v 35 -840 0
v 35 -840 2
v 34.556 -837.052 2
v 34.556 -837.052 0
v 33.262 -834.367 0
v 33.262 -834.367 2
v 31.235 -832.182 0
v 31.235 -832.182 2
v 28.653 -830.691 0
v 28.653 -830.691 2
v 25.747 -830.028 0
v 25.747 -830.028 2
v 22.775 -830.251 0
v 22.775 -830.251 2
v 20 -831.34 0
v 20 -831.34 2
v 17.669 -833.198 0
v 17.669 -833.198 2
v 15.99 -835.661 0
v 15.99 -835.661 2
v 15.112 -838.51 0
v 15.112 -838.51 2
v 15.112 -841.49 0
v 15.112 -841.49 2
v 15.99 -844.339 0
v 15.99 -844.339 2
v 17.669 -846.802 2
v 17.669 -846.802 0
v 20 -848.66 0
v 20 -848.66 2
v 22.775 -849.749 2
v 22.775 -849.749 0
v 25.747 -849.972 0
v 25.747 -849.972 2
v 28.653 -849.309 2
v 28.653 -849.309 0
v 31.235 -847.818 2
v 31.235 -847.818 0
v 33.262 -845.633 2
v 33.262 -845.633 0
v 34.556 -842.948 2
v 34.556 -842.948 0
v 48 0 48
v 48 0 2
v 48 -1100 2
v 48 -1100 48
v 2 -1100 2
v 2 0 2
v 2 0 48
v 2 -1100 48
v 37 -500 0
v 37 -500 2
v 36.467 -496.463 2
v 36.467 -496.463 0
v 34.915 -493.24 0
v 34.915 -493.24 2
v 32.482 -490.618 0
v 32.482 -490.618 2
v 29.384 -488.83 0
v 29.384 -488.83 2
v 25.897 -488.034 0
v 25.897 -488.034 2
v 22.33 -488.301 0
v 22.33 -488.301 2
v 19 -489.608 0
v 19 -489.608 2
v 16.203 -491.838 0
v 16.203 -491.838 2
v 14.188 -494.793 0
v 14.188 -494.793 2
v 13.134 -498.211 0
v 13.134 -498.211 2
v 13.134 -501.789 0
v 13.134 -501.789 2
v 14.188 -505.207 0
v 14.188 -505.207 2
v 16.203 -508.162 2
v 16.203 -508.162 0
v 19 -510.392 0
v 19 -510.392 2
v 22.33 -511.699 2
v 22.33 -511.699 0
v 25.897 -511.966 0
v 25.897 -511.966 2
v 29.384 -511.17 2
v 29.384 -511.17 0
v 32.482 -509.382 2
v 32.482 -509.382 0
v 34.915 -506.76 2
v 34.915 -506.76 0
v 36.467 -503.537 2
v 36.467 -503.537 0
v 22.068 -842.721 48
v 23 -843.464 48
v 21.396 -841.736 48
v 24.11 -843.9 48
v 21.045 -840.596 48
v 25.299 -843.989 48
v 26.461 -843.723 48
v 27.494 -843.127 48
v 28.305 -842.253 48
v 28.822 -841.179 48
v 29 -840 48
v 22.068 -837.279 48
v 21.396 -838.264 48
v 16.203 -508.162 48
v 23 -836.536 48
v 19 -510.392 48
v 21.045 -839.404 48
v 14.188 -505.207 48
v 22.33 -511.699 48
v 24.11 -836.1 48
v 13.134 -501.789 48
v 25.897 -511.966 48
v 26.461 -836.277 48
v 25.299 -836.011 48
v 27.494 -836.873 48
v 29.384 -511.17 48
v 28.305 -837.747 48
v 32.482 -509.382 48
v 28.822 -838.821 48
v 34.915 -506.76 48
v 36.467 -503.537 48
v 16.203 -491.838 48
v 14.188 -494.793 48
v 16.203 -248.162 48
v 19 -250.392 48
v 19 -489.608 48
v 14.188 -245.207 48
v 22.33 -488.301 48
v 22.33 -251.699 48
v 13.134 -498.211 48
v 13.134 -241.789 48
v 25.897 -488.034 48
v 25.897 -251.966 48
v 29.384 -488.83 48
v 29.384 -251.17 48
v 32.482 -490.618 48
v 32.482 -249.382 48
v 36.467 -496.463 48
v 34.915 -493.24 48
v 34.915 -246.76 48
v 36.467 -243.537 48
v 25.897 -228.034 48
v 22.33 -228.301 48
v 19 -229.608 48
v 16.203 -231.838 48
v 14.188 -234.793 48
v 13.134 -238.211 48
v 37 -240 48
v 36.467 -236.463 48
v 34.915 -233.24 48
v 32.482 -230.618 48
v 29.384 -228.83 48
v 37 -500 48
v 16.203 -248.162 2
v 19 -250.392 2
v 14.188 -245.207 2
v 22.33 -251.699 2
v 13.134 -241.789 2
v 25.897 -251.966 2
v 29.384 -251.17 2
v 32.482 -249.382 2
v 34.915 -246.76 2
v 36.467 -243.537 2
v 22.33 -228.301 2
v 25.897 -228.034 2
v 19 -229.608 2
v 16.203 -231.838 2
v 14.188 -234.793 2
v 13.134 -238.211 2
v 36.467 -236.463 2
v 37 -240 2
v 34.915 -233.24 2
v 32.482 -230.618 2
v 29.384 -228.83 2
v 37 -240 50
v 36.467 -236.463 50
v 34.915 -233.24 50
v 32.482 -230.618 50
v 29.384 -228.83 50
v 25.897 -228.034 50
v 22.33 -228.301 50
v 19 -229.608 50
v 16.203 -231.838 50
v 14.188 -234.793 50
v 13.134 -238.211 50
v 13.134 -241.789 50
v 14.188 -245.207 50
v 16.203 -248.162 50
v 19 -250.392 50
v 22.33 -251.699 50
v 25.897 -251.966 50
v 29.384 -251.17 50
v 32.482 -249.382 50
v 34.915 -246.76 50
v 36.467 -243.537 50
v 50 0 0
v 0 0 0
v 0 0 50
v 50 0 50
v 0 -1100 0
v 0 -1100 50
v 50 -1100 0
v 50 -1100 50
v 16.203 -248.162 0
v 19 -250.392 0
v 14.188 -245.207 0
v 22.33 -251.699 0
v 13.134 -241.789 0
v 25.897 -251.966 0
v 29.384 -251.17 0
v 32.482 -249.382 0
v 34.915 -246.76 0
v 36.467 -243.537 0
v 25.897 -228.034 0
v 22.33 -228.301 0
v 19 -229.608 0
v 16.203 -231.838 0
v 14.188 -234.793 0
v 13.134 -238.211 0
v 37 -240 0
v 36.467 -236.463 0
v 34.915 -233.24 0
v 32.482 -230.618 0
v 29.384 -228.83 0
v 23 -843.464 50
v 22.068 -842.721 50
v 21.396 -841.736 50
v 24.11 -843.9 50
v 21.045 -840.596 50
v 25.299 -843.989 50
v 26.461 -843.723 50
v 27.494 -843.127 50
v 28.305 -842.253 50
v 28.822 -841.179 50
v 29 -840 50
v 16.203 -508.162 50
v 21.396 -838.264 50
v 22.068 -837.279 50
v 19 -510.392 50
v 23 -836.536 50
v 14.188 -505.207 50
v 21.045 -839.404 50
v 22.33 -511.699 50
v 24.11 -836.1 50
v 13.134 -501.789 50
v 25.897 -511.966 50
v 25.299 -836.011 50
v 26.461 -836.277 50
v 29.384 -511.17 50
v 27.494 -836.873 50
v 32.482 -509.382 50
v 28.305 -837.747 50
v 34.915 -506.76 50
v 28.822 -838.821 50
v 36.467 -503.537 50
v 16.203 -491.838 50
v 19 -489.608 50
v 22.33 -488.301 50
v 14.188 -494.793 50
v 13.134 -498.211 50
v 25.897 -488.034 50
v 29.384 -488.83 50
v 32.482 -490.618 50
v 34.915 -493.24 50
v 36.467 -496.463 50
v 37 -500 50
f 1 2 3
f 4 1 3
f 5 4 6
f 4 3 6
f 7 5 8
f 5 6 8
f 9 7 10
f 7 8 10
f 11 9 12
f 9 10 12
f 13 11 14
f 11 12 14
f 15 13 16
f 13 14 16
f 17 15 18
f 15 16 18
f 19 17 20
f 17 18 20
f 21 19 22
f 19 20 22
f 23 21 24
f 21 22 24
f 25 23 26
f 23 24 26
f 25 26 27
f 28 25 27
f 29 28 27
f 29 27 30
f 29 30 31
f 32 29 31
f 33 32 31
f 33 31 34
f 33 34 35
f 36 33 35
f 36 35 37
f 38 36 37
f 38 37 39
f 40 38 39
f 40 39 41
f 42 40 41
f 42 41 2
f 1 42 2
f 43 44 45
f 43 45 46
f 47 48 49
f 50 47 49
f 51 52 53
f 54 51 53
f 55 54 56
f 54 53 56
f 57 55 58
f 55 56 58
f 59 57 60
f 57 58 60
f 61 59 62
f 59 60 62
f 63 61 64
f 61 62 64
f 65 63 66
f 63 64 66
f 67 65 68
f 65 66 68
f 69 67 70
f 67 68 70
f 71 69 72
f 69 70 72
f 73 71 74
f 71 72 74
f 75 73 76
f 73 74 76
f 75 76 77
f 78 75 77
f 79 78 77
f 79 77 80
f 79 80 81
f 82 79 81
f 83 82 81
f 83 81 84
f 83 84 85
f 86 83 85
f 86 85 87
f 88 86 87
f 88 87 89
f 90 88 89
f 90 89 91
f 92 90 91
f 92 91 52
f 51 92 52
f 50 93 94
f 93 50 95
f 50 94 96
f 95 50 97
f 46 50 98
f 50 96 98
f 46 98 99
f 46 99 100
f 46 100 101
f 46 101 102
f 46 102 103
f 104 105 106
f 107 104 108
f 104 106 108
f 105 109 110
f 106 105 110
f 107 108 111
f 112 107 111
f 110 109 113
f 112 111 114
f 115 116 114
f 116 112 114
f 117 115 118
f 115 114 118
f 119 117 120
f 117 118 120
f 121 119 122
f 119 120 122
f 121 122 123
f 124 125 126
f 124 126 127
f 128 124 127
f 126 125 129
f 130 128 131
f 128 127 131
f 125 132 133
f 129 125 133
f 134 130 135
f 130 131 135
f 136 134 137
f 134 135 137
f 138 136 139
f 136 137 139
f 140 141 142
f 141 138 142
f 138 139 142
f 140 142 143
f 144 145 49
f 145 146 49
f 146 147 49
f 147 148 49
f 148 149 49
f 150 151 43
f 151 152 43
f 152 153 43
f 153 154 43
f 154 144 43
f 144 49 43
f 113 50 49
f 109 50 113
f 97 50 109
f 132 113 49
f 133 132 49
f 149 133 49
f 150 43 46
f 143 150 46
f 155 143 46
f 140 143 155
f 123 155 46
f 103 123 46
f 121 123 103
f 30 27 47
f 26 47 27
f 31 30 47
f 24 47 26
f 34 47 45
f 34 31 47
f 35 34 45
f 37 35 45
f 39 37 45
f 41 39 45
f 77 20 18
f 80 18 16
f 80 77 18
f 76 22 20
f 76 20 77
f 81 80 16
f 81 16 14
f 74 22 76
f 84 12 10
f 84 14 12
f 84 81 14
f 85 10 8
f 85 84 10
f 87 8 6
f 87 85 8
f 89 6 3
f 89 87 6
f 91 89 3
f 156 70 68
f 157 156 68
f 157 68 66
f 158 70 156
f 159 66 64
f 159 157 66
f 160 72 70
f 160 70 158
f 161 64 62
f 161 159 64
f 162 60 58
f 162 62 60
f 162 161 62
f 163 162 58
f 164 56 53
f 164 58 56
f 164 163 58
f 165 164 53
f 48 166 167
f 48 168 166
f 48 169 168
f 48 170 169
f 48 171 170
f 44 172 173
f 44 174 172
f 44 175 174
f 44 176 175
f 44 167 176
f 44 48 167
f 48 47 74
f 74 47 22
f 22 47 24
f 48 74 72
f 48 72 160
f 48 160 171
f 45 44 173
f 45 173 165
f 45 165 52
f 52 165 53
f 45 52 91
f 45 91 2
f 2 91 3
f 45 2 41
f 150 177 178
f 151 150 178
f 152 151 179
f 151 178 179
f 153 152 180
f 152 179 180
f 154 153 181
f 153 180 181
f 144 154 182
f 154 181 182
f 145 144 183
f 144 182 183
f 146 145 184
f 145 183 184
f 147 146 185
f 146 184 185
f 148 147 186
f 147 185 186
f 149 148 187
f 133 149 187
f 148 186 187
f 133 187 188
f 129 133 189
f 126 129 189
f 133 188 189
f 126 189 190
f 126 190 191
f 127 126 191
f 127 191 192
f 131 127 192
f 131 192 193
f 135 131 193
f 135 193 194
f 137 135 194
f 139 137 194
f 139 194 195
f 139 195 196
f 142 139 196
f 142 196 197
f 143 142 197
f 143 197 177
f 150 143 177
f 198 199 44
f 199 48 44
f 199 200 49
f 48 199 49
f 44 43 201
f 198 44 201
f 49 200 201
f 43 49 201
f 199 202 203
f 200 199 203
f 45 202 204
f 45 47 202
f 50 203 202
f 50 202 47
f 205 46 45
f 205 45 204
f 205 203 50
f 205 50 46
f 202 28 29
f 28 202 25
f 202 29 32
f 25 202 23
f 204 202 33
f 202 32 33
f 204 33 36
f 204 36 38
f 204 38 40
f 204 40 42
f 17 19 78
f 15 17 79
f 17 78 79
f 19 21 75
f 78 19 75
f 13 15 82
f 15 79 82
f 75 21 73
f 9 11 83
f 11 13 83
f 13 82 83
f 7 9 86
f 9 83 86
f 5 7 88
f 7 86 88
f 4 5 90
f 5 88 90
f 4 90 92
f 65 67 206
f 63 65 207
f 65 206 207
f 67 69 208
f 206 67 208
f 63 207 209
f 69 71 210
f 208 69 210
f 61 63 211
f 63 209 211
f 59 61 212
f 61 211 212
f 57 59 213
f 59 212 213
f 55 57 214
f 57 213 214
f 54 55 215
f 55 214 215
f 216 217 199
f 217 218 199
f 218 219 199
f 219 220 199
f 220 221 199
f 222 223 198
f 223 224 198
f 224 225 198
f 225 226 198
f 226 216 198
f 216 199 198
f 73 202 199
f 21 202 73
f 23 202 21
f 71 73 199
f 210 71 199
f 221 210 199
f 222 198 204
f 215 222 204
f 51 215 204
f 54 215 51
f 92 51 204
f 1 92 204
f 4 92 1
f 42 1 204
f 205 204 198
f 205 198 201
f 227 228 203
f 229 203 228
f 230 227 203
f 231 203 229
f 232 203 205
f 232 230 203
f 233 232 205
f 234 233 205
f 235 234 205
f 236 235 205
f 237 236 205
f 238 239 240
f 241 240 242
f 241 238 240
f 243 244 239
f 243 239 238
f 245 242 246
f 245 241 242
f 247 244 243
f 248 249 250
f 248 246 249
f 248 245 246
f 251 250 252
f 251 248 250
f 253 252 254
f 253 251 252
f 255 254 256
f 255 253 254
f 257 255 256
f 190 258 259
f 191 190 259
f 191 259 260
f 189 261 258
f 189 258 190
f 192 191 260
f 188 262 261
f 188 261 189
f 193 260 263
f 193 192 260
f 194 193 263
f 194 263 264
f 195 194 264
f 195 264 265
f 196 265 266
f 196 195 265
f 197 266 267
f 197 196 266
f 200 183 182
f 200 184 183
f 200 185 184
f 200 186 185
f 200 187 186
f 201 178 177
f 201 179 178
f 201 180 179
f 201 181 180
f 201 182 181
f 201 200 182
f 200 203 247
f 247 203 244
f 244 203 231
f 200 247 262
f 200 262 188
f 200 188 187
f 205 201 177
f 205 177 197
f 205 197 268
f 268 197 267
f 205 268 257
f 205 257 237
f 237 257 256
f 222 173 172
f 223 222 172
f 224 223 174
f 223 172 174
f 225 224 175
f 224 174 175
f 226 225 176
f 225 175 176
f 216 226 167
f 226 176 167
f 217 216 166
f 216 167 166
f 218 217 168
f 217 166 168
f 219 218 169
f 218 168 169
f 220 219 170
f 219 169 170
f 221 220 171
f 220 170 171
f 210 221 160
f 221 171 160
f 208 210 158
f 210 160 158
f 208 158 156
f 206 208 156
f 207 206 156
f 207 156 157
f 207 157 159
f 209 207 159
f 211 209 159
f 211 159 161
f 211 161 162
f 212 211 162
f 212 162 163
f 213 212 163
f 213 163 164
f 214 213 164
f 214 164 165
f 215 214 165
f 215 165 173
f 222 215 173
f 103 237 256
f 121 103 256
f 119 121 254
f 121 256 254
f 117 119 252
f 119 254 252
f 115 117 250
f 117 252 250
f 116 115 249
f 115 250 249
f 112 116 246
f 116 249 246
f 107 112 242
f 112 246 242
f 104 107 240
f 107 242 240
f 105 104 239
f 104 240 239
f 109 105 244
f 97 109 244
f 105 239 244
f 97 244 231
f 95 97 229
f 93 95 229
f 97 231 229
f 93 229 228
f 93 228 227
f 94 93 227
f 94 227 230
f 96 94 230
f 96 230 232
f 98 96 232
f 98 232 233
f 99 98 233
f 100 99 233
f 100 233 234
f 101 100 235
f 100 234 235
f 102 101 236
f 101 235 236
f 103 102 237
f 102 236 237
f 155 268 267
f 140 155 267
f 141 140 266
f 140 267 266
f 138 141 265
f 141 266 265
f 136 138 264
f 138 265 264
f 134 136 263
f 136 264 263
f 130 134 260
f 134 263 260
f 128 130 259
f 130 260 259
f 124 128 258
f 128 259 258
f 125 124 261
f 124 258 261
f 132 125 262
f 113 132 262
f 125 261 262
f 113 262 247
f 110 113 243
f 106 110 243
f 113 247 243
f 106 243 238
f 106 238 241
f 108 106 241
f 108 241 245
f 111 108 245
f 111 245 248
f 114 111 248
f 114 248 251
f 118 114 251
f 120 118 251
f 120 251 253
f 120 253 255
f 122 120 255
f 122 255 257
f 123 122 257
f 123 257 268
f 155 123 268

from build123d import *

# Parameters (mm, degrees)
F0_W     = 50
F0_H     = 50
F0_W_2   = 46
F0_H_2   = 46
F1_DEPTH = 1100
F2_R     = 12
F3_DEPTH = 50.001
F4_R     = 10
F5_DEPTH = 50.001
F6_R     = 10
F6_R_2   = 4
F7_DEPTH = 2


with BuildPart() as f1:
    # F0 (on Front) → F1 (new body)
    with BuildSketch(Plane.XZ):
        with Locations((25, 25)):
            Rectangle(F0_W, F0_H)
        with Locations((25, 25)):
            Rectangle(F0_W_2, F0_H_2, mode=Mode.SUBTRACT)
    extrude(amount=F1_DEPTH)

    # F2 (on face) → F3 (cut, through all)
    with BuildSketch(Plane.XY.offset(50)):
        with Locations((25, -500)):
            Circle(F2_R)
        with Locations((25, -240)):
            Circle(F2_R)
    extrude(amount=-F3_DEPTH, mode=Mode.SUBTRACT)

    # F4 (on face) → F5 (cut, through all)
    with BuildSketch(Plane.XY.offset(50)):
        with Locations((25, -840)):
            Circle(F4_R)
    extrude(amount=-F5_DEPTH, mode=Mode.SUBTRACT)

    # F6 (on face) → F7 (join)
    with BuildSketch(Plane.XY.offset(50)):
        with Locations((25, -840)):
            Circle(F6_R)
        with Locations((25, -840)):
            Circle(F6_R_2, mode=Mode.SUBTRACT)
    extrude(amount=-F7_DEPTH)


solid = f1.part
